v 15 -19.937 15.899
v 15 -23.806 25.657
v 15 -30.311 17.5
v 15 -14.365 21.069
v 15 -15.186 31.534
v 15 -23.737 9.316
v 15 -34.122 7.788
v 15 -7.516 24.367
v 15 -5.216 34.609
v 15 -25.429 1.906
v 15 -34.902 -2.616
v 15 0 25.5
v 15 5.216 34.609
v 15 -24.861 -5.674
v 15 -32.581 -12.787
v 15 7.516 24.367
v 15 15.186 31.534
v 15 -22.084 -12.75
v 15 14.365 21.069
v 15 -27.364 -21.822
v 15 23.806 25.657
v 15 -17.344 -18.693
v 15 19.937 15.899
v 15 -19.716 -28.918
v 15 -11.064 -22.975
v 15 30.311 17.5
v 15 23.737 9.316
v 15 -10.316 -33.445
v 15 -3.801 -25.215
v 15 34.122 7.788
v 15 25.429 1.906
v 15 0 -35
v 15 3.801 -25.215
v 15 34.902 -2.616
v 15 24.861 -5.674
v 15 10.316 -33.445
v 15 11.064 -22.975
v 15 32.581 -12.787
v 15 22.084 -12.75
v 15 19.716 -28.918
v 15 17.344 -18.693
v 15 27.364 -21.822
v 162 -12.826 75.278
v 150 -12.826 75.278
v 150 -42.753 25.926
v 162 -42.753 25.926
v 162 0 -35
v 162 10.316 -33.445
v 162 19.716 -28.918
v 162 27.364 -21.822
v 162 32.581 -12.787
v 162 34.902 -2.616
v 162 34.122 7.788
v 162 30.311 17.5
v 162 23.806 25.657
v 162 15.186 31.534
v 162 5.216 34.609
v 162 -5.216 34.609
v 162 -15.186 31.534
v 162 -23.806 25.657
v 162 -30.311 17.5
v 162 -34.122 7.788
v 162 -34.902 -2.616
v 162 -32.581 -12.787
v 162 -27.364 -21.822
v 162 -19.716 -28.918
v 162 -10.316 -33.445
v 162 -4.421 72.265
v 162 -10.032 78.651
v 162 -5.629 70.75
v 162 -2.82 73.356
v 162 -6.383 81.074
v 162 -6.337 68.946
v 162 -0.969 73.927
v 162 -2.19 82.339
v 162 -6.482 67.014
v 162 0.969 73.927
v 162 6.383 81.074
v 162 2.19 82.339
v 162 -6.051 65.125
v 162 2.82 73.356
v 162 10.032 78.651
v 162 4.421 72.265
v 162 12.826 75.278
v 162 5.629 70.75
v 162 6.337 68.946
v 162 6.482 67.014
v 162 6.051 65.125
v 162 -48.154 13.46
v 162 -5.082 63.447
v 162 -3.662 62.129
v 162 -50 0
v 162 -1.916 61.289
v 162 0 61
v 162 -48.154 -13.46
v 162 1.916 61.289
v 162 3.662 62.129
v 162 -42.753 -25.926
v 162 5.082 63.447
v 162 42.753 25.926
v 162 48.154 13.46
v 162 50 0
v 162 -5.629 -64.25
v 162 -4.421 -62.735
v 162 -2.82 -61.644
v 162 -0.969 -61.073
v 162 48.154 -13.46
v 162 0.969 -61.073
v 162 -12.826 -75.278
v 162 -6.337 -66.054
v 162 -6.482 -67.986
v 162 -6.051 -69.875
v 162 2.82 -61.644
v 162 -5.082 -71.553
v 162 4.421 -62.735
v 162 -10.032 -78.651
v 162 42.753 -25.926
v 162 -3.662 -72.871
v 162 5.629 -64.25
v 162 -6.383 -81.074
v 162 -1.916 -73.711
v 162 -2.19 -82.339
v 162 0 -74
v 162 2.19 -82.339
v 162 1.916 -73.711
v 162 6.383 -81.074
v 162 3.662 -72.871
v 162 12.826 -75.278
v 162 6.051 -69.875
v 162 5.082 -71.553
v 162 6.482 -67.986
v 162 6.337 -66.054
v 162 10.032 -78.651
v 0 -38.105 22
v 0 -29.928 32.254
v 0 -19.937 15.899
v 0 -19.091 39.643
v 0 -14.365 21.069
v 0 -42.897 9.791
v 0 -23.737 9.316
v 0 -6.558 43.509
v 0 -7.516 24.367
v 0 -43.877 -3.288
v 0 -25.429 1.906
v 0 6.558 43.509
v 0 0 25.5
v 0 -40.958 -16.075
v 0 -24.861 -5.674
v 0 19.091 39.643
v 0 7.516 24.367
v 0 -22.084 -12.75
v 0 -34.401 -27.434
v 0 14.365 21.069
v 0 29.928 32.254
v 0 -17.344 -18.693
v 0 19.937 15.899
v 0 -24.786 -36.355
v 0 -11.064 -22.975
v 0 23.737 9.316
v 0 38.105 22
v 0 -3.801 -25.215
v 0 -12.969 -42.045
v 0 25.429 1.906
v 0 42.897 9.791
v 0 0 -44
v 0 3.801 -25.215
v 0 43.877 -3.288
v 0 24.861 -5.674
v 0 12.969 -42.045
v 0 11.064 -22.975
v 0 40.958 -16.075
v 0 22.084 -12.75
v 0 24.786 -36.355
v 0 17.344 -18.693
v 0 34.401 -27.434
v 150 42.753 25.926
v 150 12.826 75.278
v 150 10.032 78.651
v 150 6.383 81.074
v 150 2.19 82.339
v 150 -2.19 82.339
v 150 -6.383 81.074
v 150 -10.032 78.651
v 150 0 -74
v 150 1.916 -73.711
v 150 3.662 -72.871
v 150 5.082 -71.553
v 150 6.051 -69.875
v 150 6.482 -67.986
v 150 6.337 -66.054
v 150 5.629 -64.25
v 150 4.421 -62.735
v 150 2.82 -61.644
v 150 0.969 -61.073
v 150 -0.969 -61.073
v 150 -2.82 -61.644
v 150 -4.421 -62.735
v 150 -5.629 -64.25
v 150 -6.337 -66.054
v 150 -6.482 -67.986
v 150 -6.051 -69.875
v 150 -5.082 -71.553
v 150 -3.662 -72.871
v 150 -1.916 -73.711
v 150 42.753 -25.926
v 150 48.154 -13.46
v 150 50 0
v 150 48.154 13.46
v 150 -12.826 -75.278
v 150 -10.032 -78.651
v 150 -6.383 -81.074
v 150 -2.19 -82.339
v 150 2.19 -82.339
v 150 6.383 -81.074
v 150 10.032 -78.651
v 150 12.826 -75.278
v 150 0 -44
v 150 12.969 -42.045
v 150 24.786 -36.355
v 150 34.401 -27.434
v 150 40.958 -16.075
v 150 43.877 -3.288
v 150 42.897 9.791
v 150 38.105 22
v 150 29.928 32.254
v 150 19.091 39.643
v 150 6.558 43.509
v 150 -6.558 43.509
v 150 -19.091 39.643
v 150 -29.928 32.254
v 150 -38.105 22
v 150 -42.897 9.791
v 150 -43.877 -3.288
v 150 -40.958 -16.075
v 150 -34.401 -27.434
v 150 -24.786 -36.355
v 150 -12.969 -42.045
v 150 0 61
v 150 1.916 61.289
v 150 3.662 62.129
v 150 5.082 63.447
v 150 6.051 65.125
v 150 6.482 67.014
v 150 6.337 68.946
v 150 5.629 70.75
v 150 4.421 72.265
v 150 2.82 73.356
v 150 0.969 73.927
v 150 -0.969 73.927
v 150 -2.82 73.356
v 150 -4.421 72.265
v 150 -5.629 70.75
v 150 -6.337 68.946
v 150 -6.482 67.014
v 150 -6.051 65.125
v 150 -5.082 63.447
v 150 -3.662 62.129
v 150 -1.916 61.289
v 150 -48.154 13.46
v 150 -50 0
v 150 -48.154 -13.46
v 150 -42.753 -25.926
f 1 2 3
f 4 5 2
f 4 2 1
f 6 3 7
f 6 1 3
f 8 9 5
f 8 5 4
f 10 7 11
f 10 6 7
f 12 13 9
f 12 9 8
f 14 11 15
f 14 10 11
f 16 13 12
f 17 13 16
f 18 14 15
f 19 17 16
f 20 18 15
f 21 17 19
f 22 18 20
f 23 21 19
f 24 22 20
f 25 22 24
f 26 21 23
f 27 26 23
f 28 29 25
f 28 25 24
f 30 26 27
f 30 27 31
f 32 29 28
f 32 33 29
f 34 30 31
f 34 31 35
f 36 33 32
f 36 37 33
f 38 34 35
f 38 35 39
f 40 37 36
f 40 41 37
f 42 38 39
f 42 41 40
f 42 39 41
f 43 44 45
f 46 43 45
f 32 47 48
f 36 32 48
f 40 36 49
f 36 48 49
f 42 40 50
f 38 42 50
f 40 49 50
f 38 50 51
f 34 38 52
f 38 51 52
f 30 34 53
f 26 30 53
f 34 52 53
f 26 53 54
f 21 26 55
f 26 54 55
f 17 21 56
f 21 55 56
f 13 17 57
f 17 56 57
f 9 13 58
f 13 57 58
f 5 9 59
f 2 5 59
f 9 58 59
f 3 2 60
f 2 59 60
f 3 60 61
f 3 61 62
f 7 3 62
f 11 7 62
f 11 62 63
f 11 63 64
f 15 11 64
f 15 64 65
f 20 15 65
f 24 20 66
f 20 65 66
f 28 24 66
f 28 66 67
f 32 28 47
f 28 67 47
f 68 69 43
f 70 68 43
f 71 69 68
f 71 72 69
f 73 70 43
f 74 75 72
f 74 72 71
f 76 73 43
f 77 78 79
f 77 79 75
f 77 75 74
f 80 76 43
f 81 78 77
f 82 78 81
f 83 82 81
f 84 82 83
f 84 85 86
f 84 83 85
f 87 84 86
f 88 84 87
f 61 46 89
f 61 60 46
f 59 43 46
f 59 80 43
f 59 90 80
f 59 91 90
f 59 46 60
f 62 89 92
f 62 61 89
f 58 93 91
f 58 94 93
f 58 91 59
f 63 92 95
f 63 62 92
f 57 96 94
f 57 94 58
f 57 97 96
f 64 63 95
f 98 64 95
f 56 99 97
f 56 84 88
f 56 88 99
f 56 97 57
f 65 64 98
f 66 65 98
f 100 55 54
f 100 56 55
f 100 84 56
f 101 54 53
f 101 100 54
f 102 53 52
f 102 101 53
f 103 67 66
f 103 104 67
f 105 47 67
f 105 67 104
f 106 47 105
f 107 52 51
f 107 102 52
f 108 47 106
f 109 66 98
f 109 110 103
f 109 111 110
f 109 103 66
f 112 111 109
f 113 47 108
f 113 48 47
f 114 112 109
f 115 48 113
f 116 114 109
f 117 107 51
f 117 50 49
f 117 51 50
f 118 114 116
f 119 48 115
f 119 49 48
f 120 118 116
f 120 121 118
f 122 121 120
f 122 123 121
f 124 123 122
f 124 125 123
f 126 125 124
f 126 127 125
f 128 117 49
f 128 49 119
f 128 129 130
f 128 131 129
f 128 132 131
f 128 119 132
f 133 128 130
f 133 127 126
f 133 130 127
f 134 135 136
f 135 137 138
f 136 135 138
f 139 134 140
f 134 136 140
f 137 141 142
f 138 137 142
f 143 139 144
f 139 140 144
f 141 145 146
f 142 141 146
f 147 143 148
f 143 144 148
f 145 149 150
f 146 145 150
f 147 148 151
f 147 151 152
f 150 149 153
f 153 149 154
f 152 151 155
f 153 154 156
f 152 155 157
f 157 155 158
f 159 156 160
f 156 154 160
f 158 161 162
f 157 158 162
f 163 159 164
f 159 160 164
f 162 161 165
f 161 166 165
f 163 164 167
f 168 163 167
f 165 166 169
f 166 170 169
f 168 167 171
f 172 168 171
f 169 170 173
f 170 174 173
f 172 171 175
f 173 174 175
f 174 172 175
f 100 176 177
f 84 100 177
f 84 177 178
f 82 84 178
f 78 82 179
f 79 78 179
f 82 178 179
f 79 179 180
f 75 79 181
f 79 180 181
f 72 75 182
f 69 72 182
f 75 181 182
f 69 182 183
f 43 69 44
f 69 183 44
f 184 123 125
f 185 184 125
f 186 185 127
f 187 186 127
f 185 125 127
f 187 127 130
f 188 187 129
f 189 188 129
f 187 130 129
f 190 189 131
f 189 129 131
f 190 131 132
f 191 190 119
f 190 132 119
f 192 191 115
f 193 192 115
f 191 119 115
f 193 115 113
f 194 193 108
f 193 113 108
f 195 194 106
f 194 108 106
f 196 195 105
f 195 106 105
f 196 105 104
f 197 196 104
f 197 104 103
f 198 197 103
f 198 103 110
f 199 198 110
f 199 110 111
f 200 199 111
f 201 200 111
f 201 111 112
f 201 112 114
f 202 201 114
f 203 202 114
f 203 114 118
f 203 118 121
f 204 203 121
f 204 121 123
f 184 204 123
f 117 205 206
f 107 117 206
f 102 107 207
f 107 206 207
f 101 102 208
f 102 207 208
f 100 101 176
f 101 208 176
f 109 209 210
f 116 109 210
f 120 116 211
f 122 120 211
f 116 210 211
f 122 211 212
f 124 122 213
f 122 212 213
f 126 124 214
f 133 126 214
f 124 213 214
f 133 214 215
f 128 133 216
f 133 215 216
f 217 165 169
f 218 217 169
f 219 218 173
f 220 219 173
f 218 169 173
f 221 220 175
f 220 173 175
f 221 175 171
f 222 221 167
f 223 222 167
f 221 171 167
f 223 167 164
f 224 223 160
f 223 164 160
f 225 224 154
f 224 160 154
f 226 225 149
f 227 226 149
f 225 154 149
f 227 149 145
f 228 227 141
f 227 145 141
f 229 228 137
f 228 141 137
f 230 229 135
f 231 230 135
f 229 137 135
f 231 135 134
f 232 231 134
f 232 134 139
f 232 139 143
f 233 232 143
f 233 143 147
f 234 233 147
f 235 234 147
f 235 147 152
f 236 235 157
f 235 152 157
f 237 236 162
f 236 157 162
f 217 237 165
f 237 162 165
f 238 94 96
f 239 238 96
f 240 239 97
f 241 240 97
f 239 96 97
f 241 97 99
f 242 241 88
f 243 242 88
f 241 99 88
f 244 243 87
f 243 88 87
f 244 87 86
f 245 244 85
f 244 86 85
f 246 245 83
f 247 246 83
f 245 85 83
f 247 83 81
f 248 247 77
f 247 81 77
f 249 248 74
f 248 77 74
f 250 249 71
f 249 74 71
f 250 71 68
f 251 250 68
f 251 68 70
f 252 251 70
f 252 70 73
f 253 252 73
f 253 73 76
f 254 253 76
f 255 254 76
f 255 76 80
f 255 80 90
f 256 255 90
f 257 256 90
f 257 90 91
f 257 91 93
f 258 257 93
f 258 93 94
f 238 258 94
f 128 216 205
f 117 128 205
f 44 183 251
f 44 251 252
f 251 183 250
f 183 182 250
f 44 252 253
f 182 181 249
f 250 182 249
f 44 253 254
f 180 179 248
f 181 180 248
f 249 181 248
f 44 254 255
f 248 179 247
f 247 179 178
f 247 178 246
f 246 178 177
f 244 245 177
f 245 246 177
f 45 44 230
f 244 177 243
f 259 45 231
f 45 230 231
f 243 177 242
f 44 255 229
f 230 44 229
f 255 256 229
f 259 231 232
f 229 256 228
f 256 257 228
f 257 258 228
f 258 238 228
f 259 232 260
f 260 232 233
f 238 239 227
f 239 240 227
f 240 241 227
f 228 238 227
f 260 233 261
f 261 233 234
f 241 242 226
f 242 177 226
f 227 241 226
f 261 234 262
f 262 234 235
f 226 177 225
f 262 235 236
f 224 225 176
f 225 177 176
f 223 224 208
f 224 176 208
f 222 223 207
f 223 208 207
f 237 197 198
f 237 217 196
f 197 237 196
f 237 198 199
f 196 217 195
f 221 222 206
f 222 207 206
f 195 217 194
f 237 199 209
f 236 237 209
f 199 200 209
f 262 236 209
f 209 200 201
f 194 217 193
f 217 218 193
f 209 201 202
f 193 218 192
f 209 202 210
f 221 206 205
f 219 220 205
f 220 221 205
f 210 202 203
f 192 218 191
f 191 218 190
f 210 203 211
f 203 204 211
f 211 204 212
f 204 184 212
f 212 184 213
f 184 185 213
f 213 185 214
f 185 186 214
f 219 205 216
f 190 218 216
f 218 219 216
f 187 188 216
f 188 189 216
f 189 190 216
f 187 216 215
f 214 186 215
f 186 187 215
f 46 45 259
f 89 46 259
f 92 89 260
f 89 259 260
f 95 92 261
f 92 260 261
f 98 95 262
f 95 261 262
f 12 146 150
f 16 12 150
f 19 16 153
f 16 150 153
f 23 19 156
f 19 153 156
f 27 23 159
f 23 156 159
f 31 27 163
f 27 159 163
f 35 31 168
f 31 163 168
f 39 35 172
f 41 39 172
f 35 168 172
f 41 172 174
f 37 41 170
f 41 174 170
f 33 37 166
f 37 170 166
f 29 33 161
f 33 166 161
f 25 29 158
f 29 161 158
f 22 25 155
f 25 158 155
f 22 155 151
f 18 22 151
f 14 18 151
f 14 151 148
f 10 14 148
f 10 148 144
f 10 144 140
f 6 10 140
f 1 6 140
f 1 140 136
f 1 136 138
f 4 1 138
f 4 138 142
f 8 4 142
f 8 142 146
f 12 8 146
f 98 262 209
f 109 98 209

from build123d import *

# Parameters (mm, degrees)
SKETCH1_R           = 44
BOSS_EXTRUDE1_DEPTH = 150
BOSS_EXTRUDE2_DEPTH = 12
SKETCH5_R           = 6.5
CUT_EXTRUDE3_DEPTH  = 80
SKETCH6_R           = 35
CUT_EXTRUDE4_DEPTH  = 147
SKETCH7_R           = 25.5
CUT_EXTRUDE5_DEPTH  = 67


with BuildPart() as part:
    # Sketch1 → Boss-Extrude1 (new body)
    with BuildSketch(Plane(origin=(0, 0, 0), x_dir=(0, 0, -1), z_dir=(1, 0, 0))):
        Circle(SKETCH1_R)
    extrude(amount=BOSS_EXTRUDE1_DEPTH)

    # Sketch2 → Boss-Extrude2 (add)
    with BuildSketch(Plane(origin=(150, 0, 0), x_dir=(0, 0, -1), z_dir=(1, 0, 0))):
        with BuildLine():
            Line((-25.925925926, 42.753319928), (-75.277777778, 12.825995978))
            ThreePointArc((-75.277777778, 12.825995978), (-82.5, 0), (-75.277777778, -12.825995978))
            Line((-75.277777778, -12.825995978), (-25.925925926, -42.753319928))
            ThreePointArc((-25.925925926, -42.753319928), (0, -50), (25.925925926, -42.753319928))
            Line((25.925925926, -42.753319928), (75.277777778, -12.825995978))
            ThreePointArc((75.277777778, -12.825995978), (82.5, 0), (75.277777778, 12.825995978))
            Line((75.277777778, 12.825995978), (25.925925926, 42.753319928))
            ThreePointArc((25.925925926, 42.753319928), (0, 50), (-25.925925926, 42.753319928))
        make_face()
    extrude(amount=BOSS_EXTRUDE2_DEPTH)

    # Sketch5 → Cut-Extrude3 (cut)
    with BuildSketch(Plane(origin=(162, 0, 0), x_dir=(0, 0, -1), z_dir=(1, 0, 0))):
        with Locations((67.5, 0)):
            Circle(SKETCH5_R)
        with Locations((-67.5, 0)):
            Circle(SKETCH5_R)
    extrude(amount=-CUT_EXTRUDE3_DEPTH, mode=Mode.SUBTRACT)

    # Sketch6 → Cut-Extrude4 (cut)
    with BuildSketch(Plane(origin=(162, 0, 0), x_dir=(0, 0, -1), z_dir=(1, 0, 0))):
        Circle(SKETCH6_R)
    extrude(amount=-CUT_EXTRUDE4_DEPTH, mode=Mode.SUBTRACT)

    # Sketch7 → Cut-Extrude5 (cut)
    with BuildSketch(Plane.ZY):
        Circle(SKETCH7_R)
    extrude(amount=-CUT_EXTRUDE5_DEPTH, mode=Mode.SUBTRACT)


solid = part.part
